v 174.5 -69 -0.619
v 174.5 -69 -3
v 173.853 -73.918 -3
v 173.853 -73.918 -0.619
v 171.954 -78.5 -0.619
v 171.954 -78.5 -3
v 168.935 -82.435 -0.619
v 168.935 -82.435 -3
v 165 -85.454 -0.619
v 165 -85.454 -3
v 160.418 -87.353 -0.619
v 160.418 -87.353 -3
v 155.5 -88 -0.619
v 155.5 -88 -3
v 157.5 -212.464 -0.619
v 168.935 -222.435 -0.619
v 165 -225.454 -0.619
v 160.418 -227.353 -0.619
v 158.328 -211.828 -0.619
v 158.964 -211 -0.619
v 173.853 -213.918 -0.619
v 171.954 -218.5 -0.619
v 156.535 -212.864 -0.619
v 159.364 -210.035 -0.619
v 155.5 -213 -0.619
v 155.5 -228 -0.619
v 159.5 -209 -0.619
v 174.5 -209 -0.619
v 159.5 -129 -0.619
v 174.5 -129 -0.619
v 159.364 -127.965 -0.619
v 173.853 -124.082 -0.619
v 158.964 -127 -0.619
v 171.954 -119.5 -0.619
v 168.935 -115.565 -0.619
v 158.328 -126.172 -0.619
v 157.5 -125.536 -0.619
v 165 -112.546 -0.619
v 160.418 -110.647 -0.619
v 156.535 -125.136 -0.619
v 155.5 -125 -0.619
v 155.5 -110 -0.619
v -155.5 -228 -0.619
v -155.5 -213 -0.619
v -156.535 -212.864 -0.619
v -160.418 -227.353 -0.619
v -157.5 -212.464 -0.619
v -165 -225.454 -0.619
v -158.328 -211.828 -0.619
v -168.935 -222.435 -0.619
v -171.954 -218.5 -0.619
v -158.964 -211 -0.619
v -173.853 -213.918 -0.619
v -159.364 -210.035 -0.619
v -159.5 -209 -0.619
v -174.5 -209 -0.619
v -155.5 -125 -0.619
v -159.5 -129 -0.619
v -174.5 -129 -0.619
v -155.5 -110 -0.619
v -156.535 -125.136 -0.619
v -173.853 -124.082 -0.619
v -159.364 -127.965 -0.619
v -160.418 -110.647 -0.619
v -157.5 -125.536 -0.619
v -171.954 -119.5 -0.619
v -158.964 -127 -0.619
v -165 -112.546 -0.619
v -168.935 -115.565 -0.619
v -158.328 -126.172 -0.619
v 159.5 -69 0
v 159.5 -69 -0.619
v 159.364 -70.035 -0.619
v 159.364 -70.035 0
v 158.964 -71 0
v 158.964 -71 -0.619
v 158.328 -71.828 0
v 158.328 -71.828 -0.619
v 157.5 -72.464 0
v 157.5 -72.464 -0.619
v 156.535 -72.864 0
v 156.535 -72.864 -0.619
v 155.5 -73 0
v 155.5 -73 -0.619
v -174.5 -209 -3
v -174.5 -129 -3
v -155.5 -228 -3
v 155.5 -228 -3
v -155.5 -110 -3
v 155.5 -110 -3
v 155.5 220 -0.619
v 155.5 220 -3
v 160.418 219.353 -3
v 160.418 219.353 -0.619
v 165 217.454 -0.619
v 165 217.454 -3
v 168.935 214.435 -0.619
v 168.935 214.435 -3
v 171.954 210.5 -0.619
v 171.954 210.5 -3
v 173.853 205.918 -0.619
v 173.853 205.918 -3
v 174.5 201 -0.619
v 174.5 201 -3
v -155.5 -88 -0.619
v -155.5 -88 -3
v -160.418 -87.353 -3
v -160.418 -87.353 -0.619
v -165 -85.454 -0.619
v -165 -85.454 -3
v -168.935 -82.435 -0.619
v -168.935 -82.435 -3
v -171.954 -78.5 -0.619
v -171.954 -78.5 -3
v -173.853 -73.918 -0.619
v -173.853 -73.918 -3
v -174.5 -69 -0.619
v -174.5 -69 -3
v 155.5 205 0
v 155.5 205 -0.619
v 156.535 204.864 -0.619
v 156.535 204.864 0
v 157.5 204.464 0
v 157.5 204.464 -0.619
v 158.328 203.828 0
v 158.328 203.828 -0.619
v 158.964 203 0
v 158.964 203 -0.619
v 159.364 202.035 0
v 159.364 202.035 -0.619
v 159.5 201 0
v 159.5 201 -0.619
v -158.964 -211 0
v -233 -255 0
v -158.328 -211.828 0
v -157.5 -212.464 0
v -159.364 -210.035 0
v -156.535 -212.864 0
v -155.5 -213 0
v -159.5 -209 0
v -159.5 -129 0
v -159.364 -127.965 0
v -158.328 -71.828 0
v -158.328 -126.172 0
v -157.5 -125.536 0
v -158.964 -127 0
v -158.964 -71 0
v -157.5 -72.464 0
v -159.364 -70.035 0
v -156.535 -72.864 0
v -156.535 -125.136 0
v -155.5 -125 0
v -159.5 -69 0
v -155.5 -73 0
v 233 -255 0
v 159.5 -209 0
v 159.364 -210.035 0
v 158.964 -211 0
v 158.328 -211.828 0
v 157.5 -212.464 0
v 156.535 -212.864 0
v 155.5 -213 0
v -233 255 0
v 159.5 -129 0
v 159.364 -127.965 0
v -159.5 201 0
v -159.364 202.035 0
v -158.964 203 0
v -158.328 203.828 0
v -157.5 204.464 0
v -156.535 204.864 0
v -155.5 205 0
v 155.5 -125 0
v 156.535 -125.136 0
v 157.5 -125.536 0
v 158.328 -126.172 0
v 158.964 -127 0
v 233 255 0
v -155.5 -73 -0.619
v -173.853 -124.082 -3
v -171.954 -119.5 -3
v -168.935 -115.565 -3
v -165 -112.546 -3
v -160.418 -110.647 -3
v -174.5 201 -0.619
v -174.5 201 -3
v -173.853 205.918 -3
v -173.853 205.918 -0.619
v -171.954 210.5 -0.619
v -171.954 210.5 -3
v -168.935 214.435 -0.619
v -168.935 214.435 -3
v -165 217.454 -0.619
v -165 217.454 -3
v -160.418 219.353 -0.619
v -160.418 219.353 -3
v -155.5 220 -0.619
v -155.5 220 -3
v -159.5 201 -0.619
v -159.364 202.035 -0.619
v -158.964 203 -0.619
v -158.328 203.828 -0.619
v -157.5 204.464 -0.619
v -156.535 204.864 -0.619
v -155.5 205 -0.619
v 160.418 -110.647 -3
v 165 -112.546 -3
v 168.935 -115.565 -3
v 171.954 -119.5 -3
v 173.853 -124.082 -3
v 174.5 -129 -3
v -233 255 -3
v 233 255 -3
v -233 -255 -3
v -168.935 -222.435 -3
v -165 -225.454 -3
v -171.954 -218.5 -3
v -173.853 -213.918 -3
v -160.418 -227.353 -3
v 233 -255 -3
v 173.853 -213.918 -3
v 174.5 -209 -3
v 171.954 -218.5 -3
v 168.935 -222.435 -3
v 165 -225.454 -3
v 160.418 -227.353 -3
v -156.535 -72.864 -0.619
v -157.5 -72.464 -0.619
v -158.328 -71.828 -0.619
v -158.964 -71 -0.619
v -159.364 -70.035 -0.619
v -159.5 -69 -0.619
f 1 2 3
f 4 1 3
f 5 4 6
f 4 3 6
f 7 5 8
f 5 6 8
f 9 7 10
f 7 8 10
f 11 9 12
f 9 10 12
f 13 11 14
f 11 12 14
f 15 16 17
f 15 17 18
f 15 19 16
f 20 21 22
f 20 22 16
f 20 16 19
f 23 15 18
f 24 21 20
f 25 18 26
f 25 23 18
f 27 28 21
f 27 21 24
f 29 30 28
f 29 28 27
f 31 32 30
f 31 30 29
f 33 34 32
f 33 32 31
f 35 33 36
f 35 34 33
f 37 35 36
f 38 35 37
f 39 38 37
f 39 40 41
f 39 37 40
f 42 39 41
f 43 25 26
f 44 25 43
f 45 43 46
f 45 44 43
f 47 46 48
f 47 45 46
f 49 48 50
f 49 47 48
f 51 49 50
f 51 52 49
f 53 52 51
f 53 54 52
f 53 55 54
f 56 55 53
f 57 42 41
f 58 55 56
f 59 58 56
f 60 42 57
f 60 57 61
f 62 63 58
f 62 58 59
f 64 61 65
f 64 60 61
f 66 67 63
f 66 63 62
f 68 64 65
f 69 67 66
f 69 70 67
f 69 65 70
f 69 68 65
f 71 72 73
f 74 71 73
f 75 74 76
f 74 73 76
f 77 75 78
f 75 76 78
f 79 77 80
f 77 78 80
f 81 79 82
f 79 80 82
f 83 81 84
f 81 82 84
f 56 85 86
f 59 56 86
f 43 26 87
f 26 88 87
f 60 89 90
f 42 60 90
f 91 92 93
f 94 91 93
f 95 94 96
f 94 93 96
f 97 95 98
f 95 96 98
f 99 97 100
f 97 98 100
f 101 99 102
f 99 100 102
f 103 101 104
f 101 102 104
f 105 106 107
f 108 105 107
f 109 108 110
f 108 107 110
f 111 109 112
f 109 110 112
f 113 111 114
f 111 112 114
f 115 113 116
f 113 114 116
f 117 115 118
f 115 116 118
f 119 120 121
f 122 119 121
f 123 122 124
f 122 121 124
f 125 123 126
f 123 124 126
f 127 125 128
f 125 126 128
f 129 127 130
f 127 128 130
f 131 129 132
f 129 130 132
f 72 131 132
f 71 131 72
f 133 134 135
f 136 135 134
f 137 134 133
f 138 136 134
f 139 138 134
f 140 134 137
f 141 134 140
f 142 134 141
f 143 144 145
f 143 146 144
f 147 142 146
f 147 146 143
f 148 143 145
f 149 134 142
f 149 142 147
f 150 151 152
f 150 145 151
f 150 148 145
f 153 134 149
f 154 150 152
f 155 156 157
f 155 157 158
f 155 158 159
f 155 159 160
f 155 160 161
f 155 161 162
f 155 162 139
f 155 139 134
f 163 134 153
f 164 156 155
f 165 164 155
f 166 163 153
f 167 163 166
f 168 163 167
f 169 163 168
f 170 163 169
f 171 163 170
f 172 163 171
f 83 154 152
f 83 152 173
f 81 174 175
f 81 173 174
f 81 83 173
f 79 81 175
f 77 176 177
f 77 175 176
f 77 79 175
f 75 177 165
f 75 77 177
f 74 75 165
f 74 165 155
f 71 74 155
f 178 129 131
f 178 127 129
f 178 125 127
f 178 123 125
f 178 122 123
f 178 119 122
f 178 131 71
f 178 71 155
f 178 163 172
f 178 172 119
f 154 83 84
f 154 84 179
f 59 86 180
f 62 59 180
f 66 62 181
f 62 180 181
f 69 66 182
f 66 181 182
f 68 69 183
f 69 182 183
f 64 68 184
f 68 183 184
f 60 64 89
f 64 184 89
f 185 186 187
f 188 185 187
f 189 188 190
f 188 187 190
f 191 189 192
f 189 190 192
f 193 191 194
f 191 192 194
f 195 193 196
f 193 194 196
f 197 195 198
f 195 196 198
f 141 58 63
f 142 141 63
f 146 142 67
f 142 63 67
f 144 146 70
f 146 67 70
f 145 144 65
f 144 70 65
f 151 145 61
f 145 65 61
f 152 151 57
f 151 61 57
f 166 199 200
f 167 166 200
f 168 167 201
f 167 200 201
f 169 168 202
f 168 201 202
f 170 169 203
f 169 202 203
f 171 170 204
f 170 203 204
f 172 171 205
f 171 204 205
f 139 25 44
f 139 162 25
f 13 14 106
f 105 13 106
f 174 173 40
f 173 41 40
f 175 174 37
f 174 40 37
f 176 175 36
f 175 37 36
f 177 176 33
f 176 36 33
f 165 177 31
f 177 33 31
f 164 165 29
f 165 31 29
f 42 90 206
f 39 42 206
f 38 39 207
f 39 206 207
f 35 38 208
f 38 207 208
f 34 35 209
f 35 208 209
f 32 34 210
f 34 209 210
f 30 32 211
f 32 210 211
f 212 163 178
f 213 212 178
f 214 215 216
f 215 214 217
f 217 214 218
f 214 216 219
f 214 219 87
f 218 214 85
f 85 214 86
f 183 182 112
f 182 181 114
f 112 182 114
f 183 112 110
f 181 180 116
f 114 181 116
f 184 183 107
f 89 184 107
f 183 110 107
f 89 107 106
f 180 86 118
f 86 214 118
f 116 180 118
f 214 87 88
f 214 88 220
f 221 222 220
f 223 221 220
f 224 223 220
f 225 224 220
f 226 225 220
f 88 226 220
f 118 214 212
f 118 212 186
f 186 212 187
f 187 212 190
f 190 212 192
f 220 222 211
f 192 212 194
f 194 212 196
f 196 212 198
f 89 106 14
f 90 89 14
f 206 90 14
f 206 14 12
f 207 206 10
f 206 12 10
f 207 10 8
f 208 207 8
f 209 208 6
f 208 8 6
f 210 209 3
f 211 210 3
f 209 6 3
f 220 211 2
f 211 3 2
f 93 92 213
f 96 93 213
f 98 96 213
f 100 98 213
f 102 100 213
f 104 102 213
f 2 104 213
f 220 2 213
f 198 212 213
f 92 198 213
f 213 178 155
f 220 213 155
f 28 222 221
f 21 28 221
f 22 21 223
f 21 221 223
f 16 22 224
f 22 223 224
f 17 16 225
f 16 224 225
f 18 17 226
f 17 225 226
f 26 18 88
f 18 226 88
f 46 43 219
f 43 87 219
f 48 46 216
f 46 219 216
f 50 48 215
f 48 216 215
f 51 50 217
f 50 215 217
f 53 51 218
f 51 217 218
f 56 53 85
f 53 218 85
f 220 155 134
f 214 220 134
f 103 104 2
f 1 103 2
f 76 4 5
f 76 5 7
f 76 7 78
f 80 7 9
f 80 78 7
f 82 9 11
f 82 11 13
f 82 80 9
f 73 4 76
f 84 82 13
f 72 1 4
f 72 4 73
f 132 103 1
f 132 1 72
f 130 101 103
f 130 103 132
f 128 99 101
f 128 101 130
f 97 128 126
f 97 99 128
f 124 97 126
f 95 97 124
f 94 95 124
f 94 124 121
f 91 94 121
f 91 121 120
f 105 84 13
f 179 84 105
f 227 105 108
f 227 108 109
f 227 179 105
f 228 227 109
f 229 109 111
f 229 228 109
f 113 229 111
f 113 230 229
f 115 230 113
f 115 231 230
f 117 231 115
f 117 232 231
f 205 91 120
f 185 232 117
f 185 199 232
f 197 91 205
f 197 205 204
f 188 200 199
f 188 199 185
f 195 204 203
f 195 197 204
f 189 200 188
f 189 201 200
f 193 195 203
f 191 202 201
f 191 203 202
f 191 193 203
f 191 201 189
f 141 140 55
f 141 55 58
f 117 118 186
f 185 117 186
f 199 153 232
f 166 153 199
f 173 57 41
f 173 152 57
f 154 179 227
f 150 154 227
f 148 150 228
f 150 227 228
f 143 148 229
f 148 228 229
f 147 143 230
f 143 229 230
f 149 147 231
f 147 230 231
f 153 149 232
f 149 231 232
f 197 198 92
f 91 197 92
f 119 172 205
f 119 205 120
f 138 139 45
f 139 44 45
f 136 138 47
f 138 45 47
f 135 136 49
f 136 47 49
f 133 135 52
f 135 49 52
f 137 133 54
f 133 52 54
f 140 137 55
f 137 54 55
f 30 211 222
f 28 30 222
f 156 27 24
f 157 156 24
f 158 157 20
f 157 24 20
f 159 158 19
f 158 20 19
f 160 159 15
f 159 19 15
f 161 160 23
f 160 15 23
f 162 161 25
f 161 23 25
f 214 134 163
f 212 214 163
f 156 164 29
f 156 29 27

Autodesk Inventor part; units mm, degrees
ref_plane "YZ Plane" through (0, 0, 0) normal (1, 0, 0) x (0, 1, 0)
ref_plane "XZ Plane" through (0, 0, 0) normal (0, 1, 0) x (-1, 0, 0)
ref_plane "XY Plane" through (0, 0, 0) normal (0, 0, 1) x (1, 0, 0)
sketch "Sketch1" plane through (0, 0, 0) normal (0, 0, 1) x (1, 0, 0)
  line L0 (233, -255) -> (-233, -255)
  line L1 (-233, -255) -> (-233, 255)
  line L2 (-233, 255) -> (233, 255)
  line L3 (233, 255) -> (233, -255)
  line L4 (233, -255) -> (-233, 255) construction
  line L5 (-233, -255) -> (233, 255) construction
  point P0 (0, 0)
  dimension "d0" = 466
  dimension "d1" = 510
extrude "Extrusion1" add sketch "Sketch1" against normal blind 3
sketch "Sketch2" plane through (0, 0, 0) normal (0, 0, 1) x (1, 0, 0)
  line L0 (159.5, -73) -> (-159.5, -73)
  line L1 (-159.5, -73) -> (-159.5, 205)
  line L2 (-159.5, 205) -> (159.5, 205)
  line L3 (159.5, 205) -> (159.5, -73)
  line L4 (159.5, -73) -> (-159.5, 205) construction
  line L5 (-159.5, -73) -> (159.5, 205) construction
  line L6 (-233, 255) -> (-233, -255) projected
  line L7 (233, -255) -> (233, 255) projected
  line L8 (233, 255) -> (-233, 255) projected
  line L9 (159.5, -213) -> (-159.5, -213)
  line L10 (-159.5, -213) -> (-159.5, -125)
  line L11 (-159.5, -125) -> (159.5, -125)
  line L12 (159.5, -125) -> (159.5, -213)
  line L13 (159.5, -213) -> (-159.5, -125) construction
  line L14 (-159.5, -213) -> (159.5, -125) construction
  point P0 (0, 0)
  point P1 (0, 66)
  point P2 (0, -169)
  dimension "d4" = 73.5
  dimension "d6" = 50
  dimension "d7" = 278
  dimension "d8" = 52
  dimension "d9" = 88
extrude "Extrusion2" cut sketch "Sketch2" against normal through all
fillet "Fillet1" radius 4 8 edges at (-159.5, 205, -1.5) (159.5, 205, -1.5) (159.5, -73, -1.5) (-159.5, -73, -1.5) (-159.5, -125, -1.5) (159.5, -125, -1.5) (159.5, -213, -1.5) (-159.5, -213, -1.5)
sketch "Sketch3" plane through (0, 0, -3) normal (0, 0, -1) x (-1, 0, 0)
  line L0 (159.5, -129) -> (159.5, -209) projected
  arc A0 (155.5, -213) -> (159.5, -209) centre (155.5, -209) ccw projected
  line L1 (155.5, -213) -> (-155.5, -213) projected
  arc A1 (-159.5, -209) -> (-155.5, -213) centre (-155.5, -209) ccw projected
  line L2 (-159.5, -209) -> (-159.5, -129) projected
  arc A2 (-155.5, -125) -> (-159.5, -129) centre (-155.5, -129) ccw projected
  line L3 (-155.5, -125) -> (155.5, -125) projected
  arc A3 (159.5, -129) -> (155.5, -125) centre (155.5, -129) ccw projected
  line L4 (159.5, 201) -> (159.5, -69) projected
  arc A4 (155.5, -73) -> (159.5, -69) centre (155.5, -69) ccw projected
  line L5 (155.5, -73) -> (-155.5, -73) projected
  arc A5 (-159.5, -69) -> (-155.5, -73) centre (-155.5, -69) ccw projected
  line L6 (-159.5, -69) -> (-159.5, 201) projected
  arc A6 (-155.5, 205) -> (-159.5, 201) centre (-155.5, 201) ccw projected
  line L7 (-155.5, 205) -> (155.5, 205) projected
  arc A7 (159.5, 201) -> (155.5, 205) centre (155.5, 201) ccw projected
  line L8 (233, 255) -> (-233, 255) projected
  line L9 (-233, 255) -> (-233, -255) projected
  line L10 (-233, -255) -> (233, -255) projected
  line L11 (233, -255) -> (233, 255) projected
  line L12 (-174.5, 201) -> (-174.5, -69)
  arc A8 (-174.5, -69) -> (-155.5, -88) centre (-155.5, -69) ccw
  line L13 (-155.5, -88) -> (155.5, -88)
  arc A9 (155.5, -88) -> (174.5, -69) centre (155.5, -69) ccw
  line L14 (174.5, -69) -> (174.5, 201)
  arc A10 (174.5, 201) -> (155.5, 220) centre (155.5, 201) ccw
  line L15 (155.5, 220) -> (-155.5, 220)
  arc A11 (-155.5, 220) -> (-174.5, 201) centre (-155.5, 201) ccw
  line L16 (155.5, -110) -> (-155.5, -110)
  arc A12 (-155.5, -110) -> (-174.5, -129) centre (-155.5, -129) ccw
  line L17 (-174.5, -129) -> (-174.5, -209)
  arc A13 (-174.5, -209) -> (-155.5, -228) centre (-155.5, -209) ccw
  line L18 (-155.5, -228) -> (155.5, -228)
  arc A14 (155.5, -228) -> (174.5, -209) centre (155.5, -209) ccw
  line L19 (174.5, -209) -> (174.5, -129)
  arc A15 (174.5, -129) -> (155.5, -110) centre (155.5, -129) ccw
  point P0 (0, 0)
  dimension "d13" = 15
  dimension "d14" = 15
extrude "Extrusion3" cut sketch "Sketch3" against normal blind 2.3813 contours A11 L15 A10 L14 A9 L13 A8 L12 | A15 L19 A14 L18 A13 L17 A12 L16
properties part number "Door Panel" material "PET Plastic"
